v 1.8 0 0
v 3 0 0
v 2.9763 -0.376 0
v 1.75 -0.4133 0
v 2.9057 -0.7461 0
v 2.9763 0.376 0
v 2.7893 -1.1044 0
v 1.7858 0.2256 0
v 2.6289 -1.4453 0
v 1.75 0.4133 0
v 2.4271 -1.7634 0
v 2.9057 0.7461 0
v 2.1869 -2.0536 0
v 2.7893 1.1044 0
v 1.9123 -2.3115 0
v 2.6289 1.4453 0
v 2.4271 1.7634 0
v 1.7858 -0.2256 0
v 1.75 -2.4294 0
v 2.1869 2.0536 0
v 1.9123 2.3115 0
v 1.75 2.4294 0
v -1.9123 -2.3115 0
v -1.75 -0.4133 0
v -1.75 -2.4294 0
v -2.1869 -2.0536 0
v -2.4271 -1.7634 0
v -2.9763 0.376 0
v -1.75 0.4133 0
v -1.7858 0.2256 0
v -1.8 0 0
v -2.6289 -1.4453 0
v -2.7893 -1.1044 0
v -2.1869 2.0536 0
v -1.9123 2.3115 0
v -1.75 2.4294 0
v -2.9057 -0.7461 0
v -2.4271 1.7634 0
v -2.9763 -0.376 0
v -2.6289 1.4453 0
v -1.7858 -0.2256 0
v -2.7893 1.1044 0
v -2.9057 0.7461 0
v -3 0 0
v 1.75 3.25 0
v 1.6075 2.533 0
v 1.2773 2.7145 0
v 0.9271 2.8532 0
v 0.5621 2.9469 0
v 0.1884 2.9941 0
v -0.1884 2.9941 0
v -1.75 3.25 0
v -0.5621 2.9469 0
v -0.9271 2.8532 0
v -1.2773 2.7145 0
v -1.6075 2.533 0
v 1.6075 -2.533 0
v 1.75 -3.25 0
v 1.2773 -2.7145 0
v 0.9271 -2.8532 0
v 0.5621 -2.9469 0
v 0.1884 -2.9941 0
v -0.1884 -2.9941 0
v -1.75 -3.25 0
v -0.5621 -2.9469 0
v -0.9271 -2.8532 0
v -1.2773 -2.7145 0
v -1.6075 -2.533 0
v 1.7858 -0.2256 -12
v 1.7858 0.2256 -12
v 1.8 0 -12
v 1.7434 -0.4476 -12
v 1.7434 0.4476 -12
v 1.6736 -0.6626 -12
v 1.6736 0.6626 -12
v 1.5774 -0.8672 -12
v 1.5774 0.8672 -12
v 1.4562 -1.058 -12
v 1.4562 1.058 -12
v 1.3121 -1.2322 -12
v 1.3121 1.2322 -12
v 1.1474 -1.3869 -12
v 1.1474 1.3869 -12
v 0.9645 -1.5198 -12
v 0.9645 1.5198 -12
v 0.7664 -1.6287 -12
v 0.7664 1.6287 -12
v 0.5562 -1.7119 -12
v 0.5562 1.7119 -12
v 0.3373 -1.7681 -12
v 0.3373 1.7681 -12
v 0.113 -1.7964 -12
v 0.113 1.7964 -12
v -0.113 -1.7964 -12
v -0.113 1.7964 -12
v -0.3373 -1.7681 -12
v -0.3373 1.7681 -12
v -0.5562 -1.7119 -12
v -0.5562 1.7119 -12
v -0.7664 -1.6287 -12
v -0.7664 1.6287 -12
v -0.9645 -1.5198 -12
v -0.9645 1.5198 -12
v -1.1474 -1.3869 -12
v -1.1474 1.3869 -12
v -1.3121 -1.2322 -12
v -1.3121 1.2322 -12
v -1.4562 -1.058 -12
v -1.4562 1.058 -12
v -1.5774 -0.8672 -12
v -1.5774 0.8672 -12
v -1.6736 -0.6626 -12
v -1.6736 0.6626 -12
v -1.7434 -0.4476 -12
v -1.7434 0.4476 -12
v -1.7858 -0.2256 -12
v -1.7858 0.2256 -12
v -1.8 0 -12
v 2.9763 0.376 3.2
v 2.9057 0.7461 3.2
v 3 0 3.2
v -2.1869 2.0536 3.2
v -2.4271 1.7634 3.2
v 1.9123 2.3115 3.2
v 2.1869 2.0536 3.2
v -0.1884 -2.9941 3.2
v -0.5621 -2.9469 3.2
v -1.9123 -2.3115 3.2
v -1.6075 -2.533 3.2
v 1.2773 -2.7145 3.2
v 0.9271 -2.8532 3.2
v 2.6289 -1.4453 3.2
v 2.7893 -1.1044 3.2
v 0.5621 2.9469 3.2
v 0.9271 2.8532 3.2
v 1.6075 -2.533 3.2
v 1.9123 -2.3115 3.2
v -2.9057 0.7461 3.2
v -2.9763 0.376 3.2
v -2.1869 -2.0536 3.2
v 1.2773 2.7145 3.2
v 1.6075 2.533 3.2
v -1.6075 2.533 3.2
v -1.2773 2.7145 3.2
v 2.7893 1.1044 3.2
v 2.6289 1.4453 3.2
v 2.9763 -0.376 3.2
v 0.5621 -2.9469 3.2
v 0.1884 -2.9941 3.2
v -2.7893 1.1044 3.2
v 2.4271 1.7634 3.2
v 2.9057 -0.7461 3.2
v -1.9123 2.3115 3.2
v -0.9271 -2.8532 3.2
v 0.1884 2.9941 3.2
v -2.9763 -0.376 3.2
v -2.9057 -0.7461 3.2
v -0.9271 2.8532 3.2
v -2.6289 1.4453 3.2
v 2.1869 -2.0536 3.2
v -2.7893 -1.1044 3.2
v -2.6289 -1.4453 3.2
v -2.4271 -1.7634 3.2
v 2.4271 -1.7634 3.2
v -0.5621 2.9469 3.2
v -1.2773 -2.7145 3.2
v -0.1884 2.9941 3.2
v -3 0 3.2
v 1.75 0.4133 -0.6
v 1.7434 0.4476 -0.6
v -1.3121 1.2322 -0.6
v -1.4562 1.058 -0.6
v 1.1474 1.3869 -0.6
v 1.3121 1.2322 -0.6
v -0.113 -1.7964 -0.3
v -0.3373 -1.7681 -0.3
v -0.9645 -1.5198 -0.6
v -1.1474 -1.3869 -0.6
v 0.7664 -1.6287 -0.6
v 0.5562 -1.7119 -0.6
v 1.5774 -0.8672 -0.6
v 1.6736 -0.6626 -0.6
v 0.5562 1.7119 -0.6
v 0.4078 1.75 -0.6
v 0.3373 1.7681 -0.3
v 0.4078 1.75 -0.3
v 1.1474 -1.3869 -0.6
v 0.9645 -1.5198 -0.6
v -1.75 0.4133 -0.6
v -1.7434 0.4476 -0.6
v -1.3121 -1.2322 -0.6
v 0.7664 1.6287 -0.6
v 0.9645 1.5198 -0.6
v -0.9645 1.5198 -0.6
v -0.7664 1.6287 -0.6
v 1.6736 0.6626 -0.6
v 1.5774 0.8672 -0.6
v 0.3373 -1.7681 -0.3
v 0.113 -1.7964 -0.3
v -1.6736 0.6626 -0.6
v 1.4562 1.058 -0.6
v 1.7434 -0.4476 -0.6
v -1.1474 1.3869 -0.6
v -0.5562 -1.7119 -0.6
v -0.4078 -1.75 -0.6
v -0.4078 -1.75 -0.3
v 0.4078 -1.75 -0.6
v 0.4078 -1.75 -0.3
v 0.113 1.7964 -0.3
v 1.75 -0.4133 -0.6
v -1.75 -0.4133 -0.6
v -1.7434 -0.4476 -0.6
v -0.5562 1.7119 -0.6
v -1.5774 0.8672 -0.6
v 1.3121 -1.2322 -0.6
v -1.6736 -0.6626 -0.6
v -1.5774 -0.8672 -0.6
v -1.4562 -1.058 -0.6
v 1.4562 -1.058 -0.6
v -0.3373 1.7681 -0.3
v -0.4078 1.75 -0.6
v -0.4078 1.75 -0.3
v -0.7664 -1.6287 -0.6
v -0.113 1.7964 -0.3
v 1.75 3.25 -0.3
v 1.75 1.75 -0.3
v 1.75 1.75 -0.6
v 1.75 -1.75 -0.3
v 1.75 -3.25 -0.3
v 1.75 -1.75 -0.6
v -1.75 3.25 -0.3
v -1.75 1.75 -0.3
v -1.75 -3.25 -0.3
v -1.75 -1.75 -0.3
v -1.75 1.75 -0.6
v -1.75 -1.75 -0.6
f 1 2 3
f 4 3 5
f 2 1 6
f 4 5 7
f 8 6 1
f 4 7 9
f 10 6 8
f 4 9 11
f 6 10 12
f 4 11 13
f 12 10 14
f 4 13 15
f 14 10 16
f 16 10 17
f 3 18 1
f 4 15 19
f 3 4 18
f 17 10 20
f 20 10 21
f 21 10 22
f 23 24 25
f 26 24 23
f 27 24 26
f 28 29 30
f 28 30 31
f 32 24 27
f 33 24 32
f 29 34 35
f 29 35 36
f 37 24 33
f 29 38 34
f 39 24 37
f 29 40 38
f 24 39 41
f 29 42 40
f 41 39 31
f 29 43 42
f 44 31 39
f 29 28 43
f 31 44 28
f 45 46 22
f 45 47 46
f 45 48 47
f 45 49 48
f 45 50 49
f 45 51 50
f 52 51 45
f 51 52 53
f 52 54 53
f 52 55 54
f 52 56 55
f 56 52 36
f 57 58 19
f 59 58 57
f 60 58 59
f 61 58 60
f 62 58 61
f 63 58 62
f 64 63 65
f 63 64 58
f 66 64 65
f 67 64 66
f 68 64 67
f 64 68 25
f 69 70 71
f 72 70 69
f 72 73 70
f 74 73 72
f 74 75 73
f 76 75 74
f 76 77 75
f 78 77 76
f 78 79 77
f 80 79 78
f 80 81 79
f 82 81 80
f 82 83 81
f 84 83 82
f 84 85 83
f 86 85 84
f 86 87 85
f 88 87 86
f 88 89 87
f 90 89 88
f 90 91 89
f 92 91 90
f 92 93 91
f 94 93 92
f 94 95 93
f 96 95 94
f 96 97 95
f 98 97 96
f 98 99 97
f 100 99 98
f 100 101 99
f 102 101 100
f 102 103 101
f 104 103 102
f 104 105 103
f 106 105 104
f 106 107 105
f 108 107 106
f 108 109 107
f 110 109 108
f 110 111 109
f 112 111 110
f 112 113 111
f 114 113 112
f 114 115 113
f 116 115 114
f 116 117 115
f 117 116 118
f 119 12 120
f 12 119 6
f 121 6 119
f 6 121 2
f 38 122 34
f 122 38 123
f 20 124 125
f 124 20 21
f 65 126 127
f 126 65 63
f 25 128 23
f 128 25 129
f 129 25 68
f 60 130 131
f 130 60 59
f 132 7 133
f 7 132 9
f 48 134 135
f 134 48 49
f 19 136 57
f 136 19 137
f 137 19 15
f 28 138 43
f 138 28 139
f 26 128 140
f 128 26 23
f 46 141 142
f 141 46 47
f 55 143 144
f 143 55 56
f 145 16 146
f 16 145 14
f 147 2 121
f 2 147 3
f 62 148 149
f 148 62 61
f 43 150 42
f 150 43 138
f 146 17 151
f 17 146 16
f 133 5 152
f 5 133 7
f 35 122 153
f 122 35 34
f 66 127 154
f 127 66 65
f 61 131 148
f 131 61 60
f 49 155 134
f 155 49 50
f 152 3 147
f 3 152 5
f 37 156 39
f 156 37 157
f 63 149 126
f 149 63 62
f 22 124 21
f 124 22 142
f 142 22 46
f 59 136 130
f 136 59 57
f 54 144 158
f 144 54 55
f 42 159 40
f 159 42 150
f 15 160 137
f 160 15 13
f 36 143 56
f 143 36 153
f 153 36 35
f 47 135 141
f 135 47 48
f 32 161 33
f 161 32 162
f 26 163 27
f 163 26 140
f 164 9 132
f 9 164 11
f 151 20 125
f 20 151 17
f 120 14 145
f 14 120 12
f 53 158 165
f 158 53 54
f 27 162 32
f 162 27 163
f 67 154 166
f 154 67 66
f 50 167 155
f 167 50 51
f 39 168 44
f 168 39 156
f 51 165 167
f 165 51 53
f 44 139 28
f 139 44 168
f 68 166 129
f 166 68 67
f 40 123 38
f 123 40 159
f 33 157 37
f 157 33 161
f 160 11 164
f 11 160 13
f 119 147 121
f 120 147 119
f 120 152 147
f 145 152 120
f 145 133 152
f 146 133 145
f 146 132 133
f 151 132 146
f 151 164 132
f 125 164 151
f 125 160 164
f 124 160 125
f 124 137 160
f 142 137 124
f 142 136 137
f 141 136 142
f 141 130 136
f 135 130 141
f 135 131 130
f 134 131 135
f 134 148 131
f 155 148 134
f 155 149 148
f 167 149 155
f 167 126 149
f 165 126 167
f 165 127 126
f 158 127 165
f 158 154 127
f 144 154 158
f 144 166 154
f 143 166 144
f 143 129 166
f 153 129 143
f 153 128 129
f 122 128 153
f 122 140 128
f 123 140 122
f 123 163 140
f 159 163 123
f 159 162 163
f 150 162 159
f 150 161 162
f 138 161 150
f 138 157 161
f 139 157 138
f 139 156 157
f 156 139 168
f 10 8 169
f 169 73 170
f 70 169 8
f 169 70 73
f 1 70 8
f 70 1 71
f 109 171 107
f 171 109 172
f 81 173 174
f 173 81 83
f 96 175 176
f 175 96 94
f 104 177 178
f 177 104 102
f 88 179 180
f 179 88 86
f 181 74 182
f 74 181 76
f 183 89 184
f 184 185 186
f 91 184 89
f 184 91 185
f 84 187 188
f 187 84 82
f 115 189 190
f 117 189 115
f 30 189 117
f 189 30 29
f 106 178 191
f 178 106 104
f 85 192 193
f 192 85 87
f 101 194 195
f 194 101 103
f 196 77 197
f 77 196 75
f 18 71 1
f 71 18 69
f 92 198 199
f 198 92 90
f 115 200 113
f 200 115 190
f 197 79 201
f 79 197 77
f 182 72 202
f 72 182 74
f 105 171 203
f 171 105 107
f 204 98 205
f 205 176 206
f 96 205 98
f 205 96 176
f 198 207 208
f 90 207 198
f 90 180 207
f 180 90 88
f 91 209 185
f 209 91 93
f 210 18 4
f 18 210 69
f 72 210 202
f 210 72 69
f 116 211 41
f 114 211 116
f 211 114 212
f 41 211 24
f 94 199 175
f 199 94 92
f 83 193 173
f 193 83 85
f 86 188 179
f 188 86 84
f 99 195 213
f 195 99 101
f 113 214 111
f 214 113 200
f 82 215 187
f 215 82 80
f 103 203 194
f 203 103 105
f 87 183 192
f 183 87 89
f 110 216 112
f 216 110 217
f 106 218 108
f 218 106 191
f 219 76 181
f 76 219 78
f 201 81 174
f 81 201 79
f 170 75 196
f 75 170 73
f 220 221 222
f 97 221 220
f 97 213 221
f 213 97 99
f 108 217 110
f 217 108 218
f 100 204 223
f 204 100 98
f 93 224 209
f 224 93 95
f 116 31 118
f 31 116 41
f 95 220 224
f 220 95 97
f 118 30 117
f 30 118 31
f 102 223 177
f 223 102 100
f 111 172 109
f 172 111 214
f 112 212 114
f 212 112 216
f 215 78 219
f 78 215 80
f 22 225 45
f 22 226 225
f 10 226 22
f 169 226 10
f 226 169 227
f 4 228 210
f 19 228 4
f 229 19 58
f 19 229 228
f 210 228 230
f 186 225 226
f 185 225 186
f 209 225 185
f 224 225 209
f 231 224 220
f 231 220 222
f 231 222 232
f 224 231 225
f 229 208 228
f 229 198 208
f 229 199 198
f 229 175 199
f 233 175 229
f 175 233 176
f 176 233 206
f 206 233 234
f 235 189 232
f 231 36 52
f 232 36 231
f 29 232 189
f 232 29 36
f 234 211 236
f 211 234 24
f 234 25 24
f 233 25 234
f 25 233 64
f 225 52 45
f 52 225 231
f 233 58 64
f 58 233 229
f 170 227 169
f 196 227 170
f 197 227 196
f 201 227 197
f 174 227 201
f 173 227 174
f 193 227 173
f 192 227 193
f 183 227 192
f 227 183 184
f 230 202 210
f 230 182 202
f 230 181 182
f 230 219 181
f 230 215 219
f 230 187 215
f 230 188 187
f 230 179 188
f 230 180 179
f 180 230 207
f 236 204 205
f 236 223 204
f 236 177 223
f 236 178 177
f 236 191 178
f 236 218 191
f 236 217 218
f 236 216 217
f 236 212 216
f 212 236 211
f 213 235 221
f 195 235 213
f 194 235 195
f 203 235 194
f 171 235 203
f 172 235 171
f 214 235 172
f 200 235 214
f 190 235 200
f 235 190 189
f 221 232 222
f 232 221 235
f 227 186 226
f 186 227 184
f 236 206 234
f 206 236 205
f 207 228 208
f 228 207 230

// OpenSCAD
$fn = 50;


difference() {
	union() {
		translate(v = [0, 0, 0]) {
			rotate(a = [0, 0, 0]) {
				difference() {
					union() {
						translate(v = [0, 0, -12.0000000000]) {
							cylinder(h = 12, r = 1.5000000000);
						}
						cylinder(h = 3.2000000000, r = 3.0000000000);
						translate(v = [0, 0, -12.0000000000]) {
							cylinder(h = 12, r = 1.8000000000);
						}
						translate(v = [-1.7500000000, -3.2500000000, -0.3000000000]) {
							cube(size = [3.5000000000, 6.5000000000, 0.3000000000]);
						}
						translate(v = [-1.7500000000, -1.7500000000, -0.6000000000]) {
							cube(size = [3.5000000000, 3.5000000000, 0.3000000000]);
						}
						translate(v = [0, 0, -12.0000000000]) {
							cylinder(h = 12, r = 1.5000000000);
						}
					}
					union();
				}
			}
		}
	}
	union();
}
